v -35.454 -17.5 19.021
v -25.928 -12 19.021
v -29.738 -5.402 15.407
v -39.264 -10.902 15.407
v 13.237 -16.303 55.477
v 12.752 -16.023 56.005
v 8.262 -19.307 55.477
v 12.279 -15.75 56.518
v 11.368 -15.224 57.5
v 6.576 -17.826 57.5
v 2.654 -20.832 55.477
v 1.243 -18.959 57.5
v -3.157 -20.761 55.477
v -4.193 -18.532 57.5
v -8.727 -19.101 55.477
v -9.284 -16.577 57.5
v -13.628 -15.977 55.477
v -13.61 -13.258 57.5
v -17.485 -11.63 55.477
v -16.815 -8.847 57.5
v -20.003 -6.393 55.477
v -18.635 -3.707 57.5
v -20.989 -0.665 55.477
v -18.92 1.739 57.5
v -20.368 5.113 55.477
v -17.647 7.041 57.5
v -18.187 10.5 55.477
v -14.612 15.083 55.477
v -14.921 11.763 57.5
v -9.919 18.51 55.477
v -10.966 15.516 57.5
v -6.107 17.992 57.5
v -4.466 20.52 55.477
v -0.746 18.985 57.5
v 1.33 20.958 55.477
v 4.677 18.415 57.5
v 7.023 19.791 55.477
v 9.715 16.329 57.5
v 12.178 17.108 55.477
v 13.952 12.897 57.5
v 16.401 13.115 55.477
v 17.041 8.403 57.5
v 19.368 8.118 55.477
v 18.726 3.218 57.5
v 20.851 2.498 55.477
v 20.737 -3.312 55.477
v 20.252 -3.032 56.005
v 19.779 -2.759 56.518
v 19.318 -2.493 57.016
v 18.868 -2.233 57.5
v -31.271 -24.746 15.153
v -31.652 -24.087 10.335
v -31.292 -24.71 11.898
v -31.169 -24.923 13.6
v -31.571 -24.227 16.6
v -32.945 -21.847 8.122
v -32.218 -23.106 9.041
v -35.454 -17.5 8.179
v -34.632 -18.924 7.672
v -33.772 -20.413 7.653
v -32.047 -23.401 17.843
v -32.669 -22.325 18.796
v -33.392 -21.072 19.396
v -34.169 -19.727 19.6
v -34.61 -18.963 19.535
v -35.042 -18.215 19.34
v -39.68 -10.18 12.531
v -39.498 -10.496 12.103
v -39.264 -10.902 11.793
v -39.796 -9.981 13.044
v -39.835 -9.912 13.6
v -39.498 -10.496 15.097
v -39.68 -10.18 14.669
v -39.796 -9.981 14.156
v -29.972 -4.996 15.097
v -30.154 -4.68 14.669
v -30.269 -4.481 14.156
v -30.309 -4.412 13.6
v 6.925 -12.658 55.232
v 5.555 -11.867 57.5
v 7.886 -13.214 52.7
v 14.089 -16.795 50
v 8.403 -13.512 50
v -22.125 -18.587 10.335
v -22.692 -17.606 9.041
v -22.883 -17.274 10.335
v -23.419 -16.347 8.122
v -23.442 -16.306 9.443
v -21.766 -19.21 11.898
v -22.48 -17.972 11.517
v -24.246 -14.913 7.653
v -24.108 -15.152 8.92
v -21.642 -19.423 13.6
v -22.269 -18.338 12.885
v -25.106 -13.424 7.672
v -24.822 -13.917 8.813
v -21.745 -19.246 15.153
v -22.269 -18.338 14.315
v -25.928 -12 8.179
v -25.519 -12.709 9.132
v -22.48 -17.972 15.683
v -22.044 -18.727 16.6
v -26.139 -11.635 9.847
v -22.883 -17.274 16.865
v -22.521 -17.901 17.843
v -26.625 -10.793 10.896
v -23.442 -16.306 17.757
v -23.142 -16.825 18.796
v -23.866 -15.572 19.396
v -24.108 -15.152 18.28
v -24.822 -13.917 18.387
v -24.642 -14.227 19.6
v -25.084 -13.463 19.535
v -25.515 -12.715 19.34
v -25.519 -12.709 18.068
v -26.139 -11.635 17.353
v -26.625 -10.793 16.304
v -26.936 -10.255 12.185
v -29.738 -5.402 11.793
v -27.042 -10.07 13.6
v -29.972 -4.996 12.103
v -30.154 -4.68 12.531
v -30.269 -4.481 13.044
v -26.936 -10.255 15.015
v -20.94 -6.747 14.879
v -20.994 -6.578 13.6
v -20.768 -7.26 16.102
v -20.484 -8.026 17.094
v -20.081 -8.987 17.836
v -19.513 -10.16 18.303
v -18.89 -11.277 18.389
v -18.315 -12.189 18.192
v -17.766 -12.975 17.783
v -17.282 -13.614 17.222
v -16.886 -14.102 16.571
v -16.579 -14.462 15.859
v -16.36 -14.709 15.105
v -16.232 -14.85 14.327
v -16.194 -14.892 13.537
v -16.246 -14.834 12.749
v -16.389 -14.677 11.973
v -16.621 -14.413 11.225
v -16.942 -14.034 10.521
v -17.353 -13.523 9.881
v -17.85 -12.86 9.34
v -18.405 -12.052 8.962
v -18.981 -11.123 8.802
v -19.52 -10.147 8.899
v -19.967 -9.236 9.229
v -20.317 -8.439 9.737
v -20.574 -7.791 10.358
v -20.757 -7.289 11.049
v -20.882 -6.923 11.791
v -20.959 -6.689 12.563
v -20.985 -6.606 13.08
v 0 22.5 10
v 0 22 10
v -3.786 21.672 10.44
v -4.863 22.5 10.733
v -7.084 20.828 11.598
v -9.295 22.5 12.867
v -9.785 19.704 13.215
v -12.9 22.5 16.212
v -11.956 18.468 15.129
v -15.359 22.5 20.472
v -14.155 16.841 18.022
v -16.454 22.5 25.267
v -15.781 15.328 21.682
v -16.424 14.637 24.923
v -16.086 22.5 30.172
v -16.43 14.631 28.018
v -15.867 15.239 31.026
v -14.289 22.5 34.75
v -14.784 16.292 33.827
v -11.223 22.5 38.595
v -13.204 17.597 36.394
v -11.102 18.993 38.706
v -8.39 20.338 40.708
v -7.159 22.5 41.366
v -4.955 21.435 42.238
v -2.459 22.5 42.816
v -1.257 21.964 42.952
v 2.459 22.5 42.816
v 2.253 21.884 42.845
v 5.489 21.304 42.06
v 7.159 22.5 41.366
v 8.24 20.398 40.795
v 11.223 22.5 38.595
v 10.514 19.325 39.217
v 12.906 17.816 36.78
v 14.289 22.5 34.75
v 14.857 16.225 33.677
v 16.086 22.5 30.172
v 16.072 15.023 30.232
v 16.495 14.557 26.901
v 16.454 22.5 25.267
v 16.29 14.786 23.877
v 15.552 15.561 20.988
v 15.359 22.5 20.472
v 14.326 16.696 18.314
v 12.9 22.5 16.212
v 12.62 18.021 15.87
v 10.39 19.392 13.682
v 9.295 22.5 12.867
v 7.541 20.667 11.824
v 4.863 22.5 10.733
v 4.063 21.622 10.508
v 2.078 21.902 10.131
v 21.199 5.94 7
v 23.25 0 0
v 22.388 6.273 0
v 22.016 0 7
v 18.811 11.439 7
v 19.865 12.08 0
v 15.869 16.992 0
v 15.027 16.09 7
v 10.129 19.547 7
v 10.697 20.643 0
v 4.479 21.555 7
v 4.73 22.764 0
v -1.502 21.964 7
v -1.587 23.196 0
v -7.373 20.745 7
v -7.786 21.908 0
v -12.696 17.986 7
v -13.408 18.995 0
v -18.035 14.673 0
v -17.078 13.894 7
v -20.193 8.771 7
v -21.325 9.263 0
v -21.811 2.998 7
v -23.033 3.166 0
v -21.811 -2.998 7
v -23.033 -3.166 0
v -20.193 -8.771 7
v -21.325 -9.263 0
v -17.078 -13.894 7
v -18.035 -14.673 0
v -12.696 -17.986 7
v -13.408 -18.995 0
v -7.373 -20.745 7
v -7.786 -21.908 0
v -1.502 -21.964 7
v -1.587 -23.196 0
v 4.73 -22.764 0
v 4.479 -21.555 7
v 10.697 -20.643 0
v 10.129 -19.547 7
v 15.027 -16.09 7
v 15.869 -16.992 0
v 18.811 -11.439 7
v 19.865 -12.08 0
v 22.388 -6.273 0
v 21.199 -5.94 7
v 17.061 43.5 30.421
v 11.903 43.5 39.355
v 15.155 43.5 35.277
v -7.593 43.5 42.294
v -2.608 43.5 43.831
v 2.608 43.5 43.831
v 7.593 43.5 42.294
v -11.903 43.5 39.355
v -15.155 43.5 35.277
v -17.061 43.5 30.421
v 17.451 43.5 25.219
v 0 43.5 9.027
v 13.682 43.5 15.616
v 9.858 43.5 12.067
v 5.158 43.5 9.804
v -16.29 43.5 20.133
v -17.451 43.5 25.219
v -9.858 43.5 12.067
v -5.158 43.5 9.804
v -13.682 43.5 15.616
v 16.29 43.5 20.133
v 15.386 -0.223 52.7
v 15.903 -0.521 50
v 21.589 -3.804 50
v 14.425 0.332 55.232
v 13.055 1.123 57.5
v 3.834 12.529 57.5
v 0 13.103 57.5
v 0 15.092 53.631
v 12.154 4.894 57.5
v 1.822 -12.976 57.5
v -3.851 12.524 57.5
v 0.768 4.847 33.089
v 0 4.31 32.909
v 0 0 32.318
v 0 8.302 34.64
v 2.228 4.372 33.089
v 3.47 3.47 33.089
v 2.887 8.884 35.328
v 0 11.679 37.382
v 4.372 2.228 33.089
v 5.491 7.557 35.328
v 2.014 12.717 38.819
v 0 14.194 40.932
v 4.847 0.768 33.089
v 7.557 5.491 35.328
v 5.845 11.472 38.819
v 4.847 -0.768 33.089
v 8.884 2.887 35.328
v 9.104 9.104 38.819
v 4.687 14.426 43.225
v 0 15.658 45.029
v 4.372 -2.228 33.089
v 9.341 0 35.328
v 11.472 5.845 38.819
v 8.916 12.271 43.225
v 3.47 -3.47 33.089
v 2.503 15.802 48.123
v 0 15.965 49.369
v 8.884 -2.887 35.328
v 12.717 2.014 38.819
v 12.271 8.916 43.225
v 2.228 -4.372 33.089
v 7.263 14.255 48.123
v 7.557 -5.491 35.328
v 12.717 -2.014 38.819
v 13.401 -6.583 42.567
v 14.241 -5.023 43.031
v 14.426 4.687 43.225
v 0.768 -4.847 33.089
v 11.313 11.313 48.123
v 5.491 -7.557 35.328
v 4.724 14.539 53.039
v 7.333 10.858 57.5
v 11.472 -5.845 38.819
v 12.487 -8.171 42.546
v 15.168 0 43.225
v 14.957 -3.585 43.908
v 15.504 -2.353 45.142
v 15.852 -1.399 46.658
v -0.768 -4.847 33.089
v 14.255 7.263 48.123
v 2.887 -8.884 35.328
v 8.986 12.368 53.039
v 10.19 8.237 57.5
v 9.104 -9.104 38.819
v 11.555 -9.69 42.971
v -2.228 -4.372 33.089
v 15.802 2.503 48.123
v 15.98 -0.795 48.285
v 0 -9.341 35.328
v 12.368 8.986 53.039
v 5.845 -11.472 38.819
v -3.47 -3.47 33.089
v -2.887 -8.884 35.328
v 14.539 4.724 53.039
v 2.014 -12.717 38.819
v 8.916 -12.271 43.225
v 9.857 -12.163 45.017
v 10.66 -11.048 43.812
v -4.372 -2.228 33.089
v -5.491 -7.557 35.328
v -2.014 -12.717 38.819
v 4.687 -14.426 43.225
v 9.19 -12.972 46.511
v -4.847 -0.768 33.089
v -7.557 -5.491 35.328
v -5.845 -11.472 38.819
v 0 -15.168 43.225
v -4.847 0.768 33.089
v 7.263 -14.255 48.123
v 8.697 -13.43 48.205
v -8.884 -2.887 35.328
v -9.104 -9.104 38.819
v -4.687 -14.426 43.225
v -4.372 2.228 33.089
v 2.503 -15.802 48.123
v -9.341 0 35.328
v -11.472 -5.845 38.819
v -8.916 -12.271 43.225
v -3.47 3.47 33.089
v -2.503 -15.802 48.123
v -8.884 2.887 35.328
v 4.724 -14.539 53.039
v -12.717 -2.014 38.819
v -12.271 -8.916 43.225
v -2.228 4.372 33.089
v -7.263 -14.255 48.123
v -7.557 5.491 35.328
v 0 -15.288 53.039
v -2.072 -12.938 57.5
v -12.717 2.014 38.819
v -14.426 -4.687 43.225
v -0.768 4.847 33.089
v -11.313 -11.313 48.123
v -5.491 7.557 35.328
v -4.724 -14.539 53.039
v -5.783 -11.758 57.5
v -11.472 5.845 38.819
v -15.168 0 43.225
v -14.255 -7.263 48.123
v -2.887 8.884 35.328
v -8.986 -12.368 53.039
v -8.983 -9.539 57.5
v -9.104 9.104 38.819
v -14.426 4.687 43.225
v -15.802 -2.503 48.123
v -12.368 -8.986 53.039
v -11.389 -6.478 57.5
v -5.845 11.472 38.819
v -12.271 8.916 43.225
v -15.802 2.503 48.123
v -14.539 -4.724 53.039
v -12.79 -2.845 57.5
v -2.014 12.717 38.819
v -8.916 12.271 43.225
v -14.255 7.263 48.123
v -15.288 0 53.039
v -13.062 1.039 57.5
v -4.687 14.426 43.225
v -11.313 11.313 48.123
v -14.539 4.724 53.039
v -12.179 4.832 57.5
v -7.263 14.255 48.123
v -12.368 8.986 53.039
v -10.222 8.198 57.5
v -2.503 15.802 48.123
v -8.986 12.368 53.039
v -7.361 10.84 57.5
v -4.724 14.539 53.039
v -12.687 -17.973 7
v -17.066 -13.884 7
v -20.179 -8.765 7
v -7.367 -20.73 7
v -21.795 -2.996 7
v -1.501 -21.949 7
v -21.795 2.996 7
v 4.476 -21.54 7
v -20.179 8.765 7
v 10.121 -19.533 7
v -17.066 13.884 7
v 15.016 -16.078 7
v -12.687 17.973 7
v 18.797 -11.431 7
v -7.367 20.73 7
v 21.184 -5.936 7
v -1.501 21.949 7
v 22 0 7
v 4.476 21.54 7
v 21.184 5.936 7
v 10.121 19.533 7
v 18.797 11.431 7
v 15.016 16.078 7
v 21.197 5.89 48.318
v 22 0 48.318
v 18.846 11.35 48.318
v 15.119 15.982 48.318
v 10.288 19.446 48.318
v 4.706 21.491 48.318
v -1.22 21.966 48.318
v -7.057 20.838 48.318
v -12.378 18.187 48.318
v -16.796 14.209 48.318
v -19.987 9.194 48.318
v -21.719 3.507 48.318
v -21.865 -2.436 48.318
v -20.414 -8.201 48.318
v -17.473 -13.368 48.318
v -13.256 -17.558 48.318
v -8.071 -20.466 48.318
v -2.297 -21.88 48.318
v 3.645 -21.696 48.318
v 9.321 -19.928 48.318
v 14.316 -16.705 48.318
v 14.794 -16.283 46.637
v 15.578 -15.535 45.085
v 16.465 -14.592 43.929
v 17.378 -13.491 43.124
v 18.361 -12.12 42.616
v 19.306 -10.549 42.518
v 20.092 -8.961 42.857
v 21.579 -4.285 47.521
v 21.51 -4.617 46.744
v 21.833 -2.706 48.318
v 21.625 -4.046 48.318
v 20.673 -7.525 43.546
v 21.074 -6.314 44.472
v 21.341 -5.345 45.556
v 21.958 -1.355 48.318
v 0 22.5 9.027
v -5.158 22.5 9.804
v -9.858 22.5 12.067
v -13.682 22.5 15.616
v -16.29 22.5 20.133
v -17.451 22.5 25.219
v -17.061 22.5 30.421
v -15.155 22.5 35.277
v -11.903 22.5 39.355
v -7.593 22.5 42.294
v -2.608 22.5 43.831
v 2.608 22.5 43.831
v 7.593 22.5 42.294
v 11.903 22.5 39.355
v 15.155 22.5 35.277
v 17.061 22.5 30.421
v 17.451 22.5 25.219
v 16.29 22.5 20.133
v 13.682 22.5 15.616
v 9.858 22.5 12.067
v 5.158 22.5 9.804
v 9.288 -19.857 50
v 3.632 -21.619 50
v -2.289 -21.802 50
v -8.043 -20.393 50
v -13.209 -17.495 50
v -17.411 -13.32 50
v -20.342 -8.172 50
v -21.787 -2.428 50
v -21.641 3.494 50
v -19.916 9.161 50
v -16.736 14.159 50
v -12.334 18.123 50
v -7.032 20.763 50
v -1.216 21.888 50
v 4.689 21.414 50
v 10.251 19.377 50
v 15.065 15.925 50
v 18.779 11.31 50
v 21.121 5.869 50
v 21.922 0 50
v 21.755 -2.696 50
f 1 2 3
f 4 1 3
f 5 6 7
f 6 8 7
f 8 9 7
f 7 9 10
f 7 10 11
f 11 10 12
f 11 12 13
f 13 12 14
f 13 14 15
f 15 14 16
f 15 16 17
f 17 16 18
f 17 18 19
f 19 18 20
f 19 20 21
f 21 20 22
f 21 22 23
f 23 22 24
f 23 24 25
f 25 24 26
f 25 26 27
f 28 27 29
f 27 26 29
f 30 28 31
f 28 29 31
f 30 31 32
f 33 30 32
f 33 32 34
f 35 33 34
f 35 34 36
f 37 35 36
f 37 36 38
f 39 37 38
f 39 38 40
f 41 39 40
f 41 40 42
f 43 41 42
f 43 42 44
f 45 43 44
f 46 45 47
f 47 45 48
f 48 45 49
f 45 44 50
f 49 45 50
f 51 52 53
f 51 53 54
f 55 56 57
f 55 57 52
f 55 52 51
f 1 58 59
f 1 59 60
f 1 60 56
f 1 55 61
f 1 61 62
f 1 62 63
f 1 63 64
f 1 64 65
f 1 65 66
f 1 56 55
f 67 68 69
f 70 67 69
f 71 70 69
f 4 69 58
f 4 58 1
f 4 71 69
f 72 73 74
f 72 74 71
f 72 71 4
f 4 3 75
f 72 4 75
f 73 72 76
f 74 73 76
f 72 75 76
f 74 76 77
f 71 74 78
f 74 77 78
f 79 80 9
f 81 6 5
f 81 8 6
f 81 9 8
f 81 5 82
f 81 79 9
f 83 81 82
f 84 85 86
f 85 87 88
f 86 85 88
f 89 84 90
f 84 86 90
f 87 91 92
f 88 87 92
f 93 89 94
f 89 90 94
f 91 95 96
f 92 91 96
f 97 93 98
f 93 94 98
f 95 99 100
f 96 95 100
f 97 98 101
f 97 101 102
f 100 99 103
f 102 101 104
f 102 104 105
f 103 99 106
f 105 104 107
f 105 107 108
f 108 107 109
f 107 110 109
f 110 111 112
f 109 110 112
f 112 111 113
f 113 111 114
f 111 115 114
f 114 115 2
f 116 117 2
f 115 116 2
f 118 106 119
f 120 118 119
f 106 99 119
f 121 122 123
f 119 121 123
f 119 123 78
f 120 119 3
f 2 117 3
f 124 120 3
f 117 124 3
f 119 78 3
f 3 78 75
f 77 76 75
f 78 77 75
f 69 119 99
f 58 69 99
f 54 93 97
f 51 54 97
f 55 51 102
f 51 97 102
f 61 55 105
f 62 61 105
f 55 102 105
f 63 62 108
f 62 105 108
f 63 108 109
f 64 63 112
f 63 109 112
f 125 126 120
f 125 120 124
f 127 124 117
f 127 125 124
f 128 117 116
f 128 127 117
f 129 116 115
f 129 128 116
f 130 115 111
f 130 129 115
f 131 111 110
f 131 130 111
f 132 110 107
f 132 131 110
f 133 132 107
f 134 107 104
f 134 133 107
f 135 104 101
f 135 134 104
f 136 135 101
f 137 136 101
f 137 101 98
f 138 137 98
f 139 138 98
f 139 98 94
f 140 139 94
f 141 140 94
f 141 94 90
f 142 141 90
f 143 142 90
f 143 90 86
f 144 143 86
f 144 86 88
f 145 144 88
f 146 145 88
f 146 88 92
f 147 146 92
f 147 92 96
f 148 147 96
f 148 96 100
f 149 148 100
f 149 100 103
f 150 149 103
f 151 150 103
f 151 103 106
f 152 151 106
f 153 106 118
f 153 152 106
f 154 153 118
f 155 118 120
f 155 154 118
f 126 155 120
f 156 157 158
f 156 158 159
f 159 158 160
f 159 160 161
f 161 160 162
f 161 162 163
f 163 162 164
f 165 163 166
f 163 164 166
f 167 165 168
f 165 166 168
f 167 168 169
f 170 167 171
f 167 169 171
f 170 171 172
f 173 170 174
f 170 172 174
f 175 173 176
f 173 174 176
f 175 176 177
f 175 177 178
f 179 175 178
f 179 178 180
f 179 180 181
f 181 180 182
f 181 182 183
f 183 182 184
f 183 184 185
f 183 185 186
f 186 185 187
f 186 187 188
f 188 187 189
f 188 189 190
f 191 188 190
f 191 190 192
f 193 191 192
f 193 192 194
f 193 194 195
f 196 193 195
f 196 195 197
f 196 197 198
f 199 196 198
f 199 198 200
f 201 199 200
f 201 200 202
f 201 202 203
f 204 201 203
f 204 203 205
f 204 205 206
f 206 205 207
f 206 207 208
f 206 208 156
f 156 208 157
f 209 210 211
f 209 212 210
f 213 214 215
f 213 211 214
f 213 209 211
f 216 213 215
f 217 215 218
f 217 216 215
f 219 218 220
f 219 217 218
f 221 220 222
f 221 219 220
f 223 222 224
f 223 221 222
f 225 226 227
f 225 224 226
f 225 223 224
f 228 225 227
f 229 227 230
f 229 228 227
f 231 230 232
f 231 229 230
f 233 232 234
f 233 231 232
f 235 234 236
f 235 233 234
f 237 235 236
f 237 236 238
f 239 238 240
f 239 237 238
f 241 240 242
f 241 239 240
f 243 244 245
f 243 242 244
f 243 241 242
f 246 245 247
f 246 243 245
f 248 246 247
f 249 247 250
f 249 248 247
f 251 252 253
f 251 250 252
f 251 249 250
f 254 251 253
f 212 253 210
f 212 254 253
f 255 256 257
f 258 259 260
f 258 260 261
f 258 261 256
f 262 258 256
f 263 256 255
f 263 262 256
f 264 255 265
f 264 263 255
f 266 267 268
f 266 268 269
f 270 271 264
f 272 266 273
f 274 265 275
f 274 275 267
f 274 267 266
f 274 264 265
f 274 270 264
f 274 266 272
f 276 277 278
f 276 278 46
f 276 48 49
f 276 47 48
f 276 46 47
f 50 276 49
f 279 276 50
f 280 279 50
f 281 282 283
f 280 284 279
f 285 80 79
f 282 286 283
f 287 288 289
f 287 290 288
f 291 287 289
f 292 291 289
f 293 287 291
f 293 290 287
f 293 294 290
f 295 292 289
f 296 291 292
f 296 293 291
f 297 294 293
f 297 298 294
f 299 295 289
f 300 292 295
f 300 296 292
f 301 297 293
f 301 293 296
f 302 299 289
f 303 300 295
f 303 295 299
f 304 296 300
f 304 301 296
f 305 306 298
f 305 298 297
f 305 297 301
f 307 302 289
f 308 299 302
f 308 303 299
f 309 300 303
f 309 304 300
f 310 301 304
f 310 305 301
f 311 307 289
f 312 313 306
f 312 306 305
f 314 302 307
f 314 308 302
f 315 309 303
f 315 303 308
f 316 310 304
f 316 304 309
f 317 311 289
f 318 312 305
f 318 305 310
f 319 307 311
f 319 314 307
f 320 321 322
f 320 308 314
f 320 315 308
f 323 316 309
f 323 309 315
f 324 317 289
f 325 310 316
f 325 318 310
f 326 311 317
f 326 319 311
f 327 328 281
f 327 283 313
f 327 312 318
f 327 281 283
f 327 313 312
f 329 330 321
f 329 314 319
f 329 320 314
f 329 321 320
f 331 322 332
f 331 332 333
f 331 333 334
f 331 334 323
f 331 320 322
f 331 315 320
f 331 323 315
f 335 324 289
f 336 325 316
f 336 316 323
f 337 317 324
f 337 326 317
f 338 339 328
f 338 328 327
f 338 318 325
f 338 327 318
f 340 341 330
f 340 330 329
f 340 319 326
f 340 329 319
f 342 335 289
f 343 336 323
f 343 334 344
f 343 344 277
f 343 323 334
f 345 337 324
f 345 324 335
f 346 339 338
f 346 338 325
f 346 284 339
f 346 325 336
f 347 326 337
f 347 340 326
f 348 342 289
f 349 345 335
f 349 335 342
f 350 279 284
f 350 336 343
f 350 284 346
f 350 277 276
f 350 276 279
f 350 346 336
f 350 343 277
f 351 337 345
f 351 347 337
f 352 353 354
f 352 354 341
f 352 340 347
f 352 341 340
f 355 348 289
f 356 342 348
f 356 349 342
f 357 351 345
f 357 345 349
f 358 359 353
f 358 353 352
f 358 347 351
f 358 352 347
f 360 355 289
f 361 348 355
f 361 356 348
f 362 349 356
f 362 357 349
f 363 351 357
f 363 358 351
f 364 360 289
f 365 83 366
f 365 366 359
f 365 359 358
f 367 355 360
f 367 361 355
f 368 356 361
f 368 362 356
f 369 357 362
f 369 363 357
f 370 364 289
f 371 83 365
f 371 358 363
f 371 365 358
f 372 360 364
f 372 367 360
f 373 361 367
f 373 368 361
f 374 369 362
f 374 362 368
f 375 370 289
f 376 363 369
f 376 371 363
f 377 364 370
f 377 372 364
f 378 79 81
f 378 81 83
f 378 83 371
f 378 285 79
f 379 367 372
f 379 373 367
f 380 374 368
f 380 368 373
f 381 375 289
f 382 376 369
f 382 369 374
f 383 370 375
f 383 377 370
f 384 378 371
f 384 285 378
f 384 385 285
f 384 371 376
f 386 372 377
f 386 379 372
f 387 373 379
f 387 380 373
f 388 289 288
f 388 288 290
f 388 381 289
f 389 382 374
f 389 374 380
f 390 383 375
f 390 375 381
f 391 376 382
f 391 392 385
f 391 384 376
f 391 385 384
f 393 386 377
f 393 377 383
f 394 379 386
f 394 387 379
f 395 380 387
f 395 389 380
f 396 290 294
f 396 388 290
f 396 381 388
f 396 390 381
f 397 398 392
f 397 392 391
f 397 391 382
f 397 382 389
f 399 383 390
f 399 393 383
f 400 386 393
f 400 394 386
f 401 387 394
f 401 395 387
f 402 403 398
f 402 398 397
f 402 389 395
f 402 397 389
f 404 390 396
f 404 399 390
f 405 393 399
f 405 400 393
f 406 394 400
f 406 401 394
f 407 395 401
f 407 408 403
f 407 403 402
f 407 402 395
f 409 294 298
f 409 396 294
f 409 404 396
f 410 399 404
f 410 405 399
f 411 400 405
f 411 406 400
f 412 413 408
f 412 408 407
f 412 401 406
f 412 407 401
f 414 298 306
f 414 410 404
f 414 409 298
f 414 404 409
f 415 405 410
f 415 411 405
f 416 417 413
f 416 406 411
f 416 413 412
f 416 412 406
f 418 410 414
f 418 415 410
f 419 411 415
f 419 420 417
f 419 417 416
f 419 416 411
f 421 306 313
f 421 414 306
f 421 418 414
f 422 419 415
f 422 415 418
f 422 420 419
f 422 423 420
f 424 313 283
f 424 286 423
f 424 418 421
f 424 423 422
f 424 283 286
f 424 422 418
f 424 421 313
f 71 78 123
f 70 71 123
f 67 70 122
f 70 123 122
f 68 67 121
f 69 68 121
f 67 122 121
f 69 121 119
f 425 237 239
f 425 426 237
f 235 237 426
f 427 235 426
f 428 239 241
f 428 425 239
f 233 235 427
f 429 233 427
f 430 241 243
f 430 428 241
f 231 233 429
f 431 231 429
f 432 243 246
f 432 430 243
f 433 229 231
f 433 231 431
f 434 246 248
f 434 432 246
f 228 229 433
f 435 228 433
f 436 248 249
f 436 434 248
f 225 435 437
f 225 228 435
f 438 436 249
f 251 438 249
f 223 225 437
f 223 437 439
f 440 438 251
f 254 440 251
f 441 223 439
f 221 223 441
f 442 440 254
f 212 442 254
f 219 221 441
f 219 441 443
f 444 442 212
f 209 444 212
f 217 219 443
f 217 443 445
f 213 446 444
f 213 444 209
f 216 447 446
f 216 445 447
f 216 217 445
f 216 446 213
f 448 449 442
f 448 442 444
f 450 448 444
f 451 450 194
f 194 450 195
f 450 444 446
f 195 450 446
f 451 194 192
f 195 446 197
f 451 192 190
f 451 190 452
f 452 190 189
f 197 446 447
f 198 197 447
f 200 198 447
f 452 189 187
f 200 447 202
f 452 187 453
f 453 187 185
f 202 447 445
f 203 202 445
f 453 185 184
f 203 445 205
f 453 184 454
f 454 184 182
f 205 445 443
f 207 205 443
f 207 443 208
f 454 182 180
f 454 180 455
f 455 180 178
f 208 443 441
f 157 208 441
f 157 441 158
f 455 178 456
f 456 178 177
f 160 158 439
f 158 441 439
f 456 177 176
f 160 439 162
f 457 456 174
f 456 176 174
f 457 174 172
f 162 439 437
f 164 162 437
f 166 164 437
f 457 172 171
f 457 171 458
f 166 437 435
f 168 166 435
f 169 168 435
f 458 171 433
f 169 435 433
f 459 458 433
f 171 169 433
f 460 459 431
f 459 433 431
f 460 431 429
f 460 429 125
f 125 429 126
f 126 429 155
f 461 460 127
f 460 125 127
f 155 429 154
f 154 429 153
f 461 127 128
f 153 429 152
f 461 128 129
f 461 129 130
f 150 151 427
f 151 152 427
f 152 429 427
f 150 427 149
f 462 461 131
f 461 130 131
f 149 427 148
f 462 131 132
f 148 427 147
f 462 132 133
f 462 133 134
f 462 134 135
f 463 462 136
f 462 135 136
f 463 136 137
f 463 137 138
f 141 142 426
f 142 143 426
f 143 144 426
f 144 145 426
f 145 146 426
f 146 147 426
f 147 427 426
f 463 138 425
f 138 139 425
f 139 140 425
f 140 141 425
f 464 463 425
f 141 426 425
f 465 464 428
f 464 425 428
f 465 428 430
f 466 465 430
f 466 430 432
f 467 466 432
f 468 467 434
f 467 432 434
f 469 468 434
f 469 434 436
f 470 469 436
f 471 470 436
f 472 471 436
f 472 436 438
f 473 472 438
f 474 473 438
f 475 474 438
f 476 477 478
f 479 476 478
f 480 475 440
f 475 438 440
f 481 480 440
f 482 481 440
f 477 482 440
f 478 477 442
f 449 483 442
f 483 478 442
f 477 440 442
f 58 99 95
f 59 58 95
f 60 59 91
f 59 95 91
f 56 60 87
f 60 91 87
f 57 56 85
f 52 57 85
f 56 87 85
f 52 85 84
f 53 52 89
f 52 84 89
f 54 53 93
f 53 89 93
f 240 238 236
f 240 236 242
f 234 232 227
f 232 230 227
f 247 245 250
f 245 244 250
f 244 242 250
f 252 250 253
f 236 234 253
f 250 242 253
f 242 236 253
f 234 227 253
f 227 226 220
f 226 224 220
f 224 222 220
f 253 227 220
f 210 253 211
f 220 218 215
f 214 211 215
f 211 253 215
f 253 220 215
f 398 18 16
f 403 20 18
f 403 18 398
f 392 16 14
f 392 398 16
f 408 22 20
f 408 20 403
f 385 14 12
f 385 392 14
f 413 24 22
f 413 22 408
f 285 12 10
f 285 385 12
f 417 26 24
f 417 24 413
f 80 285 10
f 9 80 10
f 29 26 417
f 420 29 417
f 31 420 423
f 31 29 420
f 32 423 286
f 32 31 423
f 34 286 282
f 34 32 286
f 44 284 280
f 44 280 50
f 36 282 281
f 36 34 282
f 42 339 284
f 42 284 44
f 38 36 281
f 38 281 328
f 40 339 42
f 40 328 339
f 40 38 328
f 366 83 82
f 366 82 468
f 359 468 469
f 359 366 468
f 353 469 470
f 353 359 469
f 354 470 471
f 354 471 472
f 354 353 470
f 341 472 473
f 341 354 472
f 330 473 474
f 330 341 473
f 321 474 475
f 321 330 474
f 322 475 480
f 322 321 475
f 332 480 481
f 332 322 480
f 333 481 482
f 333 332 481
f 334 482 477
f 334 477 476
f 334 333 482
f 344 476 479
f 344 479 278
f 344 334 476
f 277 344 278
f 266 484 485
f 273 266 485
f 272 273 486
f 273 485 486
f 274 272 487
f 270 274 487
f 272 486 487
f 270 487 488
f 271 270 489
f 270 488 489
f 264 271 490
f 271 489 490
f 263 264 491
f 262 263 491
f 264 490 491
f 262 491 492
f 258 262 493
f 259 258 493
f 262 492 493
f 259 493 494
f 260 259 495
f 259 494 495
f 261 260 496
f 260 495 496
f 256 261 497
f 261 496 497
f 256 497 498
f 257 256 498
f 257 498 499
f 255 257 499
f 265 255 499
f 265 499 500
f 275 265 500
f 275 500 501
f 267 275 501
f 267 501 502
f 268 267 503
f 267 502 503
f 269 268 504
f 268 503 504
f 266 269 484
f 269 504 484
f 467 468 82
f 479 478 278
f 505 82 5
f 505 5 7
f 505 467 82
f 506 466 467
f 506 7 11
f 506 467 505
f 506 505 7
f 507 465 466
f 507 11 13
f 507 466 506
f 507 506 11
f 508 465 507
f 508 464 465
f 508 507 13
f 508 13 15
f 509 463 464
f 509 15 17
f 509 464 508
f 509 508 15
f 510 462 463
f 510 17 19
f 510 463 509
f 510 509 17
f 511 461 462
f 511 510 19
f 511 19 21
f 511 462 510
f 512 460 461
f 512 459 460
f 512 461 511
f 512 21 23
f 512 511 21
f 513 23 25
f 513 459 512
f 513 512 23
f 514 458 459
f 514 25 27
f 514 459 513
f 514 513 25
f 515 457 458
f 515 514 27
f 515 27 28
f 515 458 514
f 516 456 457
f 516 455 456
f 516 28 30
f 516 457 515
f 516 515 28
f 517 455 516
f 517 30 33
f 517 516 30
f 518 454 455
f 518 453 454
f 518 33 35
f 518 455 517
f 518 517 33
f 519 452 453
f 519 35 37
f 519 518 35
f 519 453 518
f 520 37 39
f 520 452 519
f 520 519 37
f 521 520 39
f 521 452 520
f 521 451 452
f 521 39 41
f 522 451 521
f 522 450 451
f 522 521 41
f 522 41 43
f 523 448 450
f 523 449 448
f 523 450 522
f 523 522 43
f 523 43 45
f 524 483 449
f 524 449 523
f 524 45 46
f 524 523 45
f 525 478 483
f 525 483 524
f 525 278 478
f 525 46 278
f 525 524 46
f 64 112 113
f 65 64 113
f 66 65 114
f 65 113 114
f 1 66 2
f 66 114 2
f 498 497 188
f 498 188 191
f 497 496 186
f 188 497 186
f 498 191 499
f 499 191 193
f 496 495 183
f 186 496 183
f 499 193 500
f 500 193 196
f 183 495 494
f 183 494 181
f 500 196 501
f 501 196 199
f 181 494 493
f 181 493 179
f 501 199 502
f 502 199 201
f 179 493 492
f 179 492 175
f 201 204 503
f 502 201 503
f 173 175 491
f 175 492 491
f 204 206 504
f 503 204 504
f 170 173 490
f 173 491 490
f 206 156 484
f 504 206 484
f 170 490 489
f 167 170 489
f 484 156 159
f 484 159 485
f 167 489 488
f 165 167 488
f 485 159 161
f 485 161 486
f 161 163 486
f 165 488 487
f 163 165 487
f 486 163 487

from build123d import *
from OCP.BRepAlgoAPI import BRepAlgoAPI_Cut
from OCP.TopTools import TopTools_ListOfShape

# Parameters (mm, degrees)
SKETCH_1_R          = 23.25
EXTRUDE_1_DEPTH     = 7
EXTRUDE_1_TAPER     = 10
SKETCH_2_R          = 22
EXTRUDE_2_DEPTH     = 50.5
SKETCH_4_R          = 16.5
EXTRUDE_3_DEPTH     = 22.5
SKETCH_6_R          = 17.5
EXTRUDE_4_DEPTH     = 21
CUT_EXTRUDE_START   = -5.710511326
CUT_EXTRUDE_1_DEPTH = 12.710511326
SKETCH_10_R         = 4.8
EXTRUDE_5_DEPTH     = 12
EXTRUDE_6_DEPTH     = 11


with BuildPart() as part:
    # 草图1 → 凸台-拉伸1 (new body)
    with BuildSketch(Plane.XY):
        Circle(SKETCH_1_R)
    extrude(amount=EXTRUDE_1_DEPTH, taper=EXTRUDE_1_TAPER)

    # 草图2 → 凸台-拉伸2 (add)
    with BuildSketch(Plane.XY.offset(7)):
        Circle(SKETCH_2_R)
    extrude(amount=EXTRUDE_2_DEPTH)

    # 草图3 → 切除-旋转1 (revolve, cut)
    with BuildSketch(Plane(origin=(0, 0, 0), x_dir=(1, 0, 0), z_dir=(0, 1, 0))):
        with BuildLine():
            Line((21, -55.477297211), (22, -55.477297211))
            Line((22, -55.477297211), (22, -48.317565939))
            add(Edge.make_bspline(
                [(21, -55.477297211), (21.635397746, -53.150423877), (21.950433845, -50.732091094), (22, -48.317565939)],
                knots=[0, 0, 0, 0, 0.840917251, 0.840917251, 0.840917251, 0.840917251], degree=3))
        make_face()
        Polygon((19, -57.5), (22, -57.5), (22, -55.477297211), (21, -55.477297211), align=None)
    revolve(axis=Axis((0, 0, 57.5), (0, 0, -1)), mode=Mode.SUBTRACT)

    # 草图4 → 凸台-拉伸3 (add)
    with BuildSketch(Plane(origin=(0, 0, 0), x_dir=(1, 0, 0), z_dir=(0, 1, 0))):
        with Locations(Location((0, -26.5, 0), (0, 0, 90))):
            Circle(SKETCH_4_R)
    extrude(amount=EXTRUDE_3_DEPTH)

    # 草图6 → 凸台-拉伸4 (add)
    with BuildSketch(Plane(origin=(0, 22.5, 0), x_dir=(1, 0, 0), z_dir=(0, 1, 0))):
        with Locations(Location((0, -26.526637771, 0), (0, 0, 90))):
            Circle(SKETCH_6_R)
    extrude(amount=EXTRUDE_4_DEPTH)

    # 草图7 → 切除-旋转2 (revolve, cut)
    with BuildSketch(Plane(origin=(0, 0, 0), x_dir=(0, 0, -1), z_dir=(1, 0, 0))):
        with BuildLine():
            Line((-64.317565939, 0), (-32.317565939, 0))
            ThreePointArc((-32.317565939, 0), (-48.317565939, 16), (-64.317565939, 0))
        make_face()
    revolve(axis=Axis((0, 0, 57.5), (0, 0, -1)), mode=Mode.SUBTRACT)


with BuildPart() as cut_extrude_1_tool:
    # 切除-拉伸1: read off the stored shape, not the designer's step
    # 切除-拉伸1 outline → 切除-拉伸1 (new body)
    with BuildSketch(Plane(origin=(14.249995527, -8.227238754, -1.478e-06), x_dir=(0.49999999999999495, 0.8660254037844416, 0), z_dir=(0.8660254037844382, -0.49999999999999295, -8.981993465039313e-08)).offset(CUT_EXTRUDE_START)):
        with BuildLine():
            ThreePointArc((-7.5, 49.99999845), (3.87e-07, 42.5), (7.5, 49.999999225))
            Line((7.5, 49.999999225), (7.5, 57.5))
            Line((7.5, 57.5), (-7.5, 57.499999177))
            Line((-7.5, 57.499999177), (-7.5, 49.99999845))
        make_face()
    extrude(amount=CUT_EXTRUDE_1_DEPTH)


with BuildPart() as part_1:
    add(part.part)

    # 切除-拉伸1: cut by cut_extrude_1_tool, with a tolerance
    cut_extrude_1_stock = TopTools_ListOfShape()
    cut_extrude_1_stock.Append(part_1.part.wrapped)
    cut_extrude_1_tools = TopTools_ListOfShape()
    cut_extrude_1_tools.Append(cut_extrude_1_tool.part.wrapped)
    cut_extrude_1_cut = BRepAlgoAPI_Cut()
    cut_extrude_1_cut.SetArguments(cut_extrude_1_stock)
    cut_extrude_1_cut.SetTools(cut_extrude_1_tools)
    cut_extrude_1_cut.SetFuzzyValue(0.00001)
    cut_extrude_1_cut.Build()
    add(Compound.cast(cut_extrude_1_cut.Shape()).solids(), mode=Mode.REPLACE)

    # 草图10 → 凸台-拉伸5 (add)
    with BuildSketch(Plane(origin=(-14.25, -8.227241336, 0), x_dir=(0.500000000000007, -0.8660254037844346, 0), z_dir=(0.8660254037844346, 0.500000000000007, 0))):
        with Locations(Location((0, -13.6, 0), (0, 0, 180))):
            Circle(SKETCH_10_R)
    extrude(amount=-EXTRUDE_5_DEPTH)

    # 草图11 → 凸台-拉伸6 (add)
    with BuildSketch(Plane(origin=(-24.642304845, -14.227241336, 0), x_dir=(0, 0, 1), z_dir=(-0.8660254037844347, -0.500000000000007, 0))):
        with BuildLine():
            ThreePointArc((19.6, 0), (19.453472666, 1.31789899), (19.021047417, 2.571428571))
            ThreePointArc((19.021047417, 2.571428571), (16.807134903, 5.070925528), (13.6, 6))
            Line((13.6, 6), (13.6, 4.8))
            ThreePointArc((13.6, 4.8), (16.99411255, 3.39411255), (18.4, 0))
            ThreePointArc((18.4, 0), (16.99411255, -3.39411255), (13.6, -4.8))
            Line((13.6, -4.8), (13.6, -6))
            ThreePointArc((13.6, -6), (17.842640687, -4.242640687), (19.6, 0))
        make_face()
        with BuildLine():
            Line((13.6, 4.8), (13.6, 6))
            ThreePointArc((13.6, 6), (10.392865097, 5.070925528), (8.178952583, 2.571428571))
            ThreePointArc((8.178952583, 2.571428571), (8.529074472, -3.207134903), (13.6, -6))
            Line((13.6, -6), (13.6, -4.8))
            ThreePointArc((13.6, -4.8), (8.8, 0), (13.6, 4.8))
        make_face()
        with BuildLine():
            Line((19.021047417, 2.571428571), (15.407015806, 10.19047619))
            ThreePointArc((15.407015806, 10.19047619), (14.669044968, 11.023641843), (13.6, 11.333333333))
            Line((13.6, 11.333333333), (13.6, 6))
            ThreePointArc((13.6, 6), (16.807134903, 5.070925528), (19.021047417, 2.571428571))
        make_face()
        with BuildLine():
            Line((13.6, 6), (13.6, 11.333333333))
            ThreePointArc((13.6, 11.333333333), (12.530955032, 11.023641843), (11.792984194, 10.19047619))
            Line((11.792984194, 10.19047619), (8.178952583, 2.571428571))
            ThreePointArc((8.178952583, 2.571428571), (10.392865097, 5.070925528), (13.6, 6))
        make_face()
        with BuildLine():
            ThreePointArc((18.4, 0), (16.99411255, 3.39411255), (13.6, 4.8))
            Line((13.6, 4.8), (13.6, -4.8))
            ThreePointArc((13.6, -4.8), (16.99411255, -3.39411255), (18.4, 0))
        make_face()
        with BuildLine():
            Line((13.6, -4.8), (13.6, 4.8))
            ThreePointArc((13.6, 4.8), (8.8, 0), (13.6, -4.8))
        make_face()
    extrude(amount=EXTRUDE_6_DEPTH)


solid = part_1.part
